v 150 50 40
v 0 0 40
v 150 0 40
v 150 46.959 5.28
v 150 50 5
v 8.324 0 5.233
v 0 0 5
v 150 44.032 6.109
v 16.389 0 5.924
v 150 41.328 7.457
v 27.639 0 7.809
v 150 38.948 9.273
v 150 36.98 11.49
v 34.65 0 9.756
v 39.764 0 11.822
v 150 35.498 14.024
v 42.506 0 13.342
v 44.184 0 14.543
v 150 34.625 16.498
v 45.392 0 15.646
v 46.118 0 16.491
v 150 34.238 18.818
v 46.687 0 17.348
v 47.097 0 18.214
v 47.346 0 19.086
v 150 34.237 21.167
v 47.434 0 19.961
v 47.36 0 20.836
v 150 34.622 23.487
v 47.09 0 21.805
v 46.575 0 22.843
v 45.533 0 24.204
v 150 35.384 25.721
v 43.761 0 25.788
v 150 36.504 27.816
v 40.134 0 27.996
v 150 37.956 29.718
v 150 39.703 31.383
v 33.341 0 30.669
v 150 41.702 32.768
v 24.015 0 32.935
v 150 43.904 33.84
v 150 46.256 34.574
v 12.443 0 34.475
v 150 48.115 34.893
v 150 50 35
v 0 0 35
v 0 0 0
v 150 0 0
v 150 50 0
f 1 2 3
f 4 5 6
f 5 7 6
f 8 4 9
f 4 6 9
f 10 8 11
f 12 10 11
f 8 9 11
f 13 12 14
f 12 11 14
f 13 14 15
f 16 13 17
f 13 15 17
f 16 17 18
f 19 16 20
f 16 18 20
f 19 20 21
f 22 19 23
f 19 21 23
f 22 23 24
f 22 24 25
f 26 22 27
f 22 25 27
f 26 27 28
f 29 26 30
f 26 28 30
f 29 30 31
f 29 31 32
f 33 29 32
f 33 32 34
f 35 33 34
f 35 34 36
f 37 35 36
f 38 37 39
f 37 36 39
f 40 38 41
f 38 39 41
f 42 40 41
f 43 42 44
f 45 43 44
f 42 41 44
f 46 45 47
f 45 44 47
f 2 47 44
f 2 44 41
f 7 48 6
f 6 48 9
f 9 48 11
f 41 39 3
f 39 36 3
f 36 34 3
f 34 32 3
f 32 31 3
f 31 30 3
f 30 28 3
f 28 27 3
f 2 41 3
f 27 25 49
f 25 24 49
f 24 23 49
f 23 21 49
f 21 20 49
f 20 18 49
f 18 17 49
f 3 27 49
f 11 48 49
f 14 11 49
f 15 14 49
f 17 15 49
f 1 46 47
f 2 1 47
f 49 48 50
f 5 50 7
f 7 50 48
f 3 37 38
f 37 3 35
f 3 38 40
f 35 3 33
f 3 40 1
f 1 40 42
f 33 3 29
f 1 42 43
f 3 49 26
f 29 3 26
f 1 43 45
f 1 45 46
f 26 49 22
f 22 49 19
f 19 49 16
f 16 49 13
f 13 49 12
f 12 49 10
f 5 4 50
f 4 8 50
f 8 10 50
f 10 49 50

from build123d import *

# Parameters (mm, degrees)
BOSS_EXTRUDE1_DEPTH = 40
SKETCH4_R           = 15


with BuildPart() as part:
    # Sketch1 → Boss-Extrude1 (new body)
    with BuildSketch(Plane.XY):
        Polygon((150, 50), (0, 0), (150, 0), align=None)
    extrude(amount=BOSS_EXTRUDE1_DEPTH)

    # Cut-Sweep1: sweep along a curve in space
    with BuildLine() as cut_sweep1_path:
        Line((150, 50, 20), (0, 0, 20))
    # Sketch4 → Cut-Sweep1 (sweep, cut)
    with BuildSketch(Plane(origin=(150, 50, 0), x_dir=(0, 0, 1), z_dir=(-0.948683298, -0.316227766, 0))):
        with Locations((20, 0)):
            Circle(SKETCH4_R)
    sweep(path=cut_sweep1_path.line, mode=Mode.SUBTRACT)


solid = part.part
